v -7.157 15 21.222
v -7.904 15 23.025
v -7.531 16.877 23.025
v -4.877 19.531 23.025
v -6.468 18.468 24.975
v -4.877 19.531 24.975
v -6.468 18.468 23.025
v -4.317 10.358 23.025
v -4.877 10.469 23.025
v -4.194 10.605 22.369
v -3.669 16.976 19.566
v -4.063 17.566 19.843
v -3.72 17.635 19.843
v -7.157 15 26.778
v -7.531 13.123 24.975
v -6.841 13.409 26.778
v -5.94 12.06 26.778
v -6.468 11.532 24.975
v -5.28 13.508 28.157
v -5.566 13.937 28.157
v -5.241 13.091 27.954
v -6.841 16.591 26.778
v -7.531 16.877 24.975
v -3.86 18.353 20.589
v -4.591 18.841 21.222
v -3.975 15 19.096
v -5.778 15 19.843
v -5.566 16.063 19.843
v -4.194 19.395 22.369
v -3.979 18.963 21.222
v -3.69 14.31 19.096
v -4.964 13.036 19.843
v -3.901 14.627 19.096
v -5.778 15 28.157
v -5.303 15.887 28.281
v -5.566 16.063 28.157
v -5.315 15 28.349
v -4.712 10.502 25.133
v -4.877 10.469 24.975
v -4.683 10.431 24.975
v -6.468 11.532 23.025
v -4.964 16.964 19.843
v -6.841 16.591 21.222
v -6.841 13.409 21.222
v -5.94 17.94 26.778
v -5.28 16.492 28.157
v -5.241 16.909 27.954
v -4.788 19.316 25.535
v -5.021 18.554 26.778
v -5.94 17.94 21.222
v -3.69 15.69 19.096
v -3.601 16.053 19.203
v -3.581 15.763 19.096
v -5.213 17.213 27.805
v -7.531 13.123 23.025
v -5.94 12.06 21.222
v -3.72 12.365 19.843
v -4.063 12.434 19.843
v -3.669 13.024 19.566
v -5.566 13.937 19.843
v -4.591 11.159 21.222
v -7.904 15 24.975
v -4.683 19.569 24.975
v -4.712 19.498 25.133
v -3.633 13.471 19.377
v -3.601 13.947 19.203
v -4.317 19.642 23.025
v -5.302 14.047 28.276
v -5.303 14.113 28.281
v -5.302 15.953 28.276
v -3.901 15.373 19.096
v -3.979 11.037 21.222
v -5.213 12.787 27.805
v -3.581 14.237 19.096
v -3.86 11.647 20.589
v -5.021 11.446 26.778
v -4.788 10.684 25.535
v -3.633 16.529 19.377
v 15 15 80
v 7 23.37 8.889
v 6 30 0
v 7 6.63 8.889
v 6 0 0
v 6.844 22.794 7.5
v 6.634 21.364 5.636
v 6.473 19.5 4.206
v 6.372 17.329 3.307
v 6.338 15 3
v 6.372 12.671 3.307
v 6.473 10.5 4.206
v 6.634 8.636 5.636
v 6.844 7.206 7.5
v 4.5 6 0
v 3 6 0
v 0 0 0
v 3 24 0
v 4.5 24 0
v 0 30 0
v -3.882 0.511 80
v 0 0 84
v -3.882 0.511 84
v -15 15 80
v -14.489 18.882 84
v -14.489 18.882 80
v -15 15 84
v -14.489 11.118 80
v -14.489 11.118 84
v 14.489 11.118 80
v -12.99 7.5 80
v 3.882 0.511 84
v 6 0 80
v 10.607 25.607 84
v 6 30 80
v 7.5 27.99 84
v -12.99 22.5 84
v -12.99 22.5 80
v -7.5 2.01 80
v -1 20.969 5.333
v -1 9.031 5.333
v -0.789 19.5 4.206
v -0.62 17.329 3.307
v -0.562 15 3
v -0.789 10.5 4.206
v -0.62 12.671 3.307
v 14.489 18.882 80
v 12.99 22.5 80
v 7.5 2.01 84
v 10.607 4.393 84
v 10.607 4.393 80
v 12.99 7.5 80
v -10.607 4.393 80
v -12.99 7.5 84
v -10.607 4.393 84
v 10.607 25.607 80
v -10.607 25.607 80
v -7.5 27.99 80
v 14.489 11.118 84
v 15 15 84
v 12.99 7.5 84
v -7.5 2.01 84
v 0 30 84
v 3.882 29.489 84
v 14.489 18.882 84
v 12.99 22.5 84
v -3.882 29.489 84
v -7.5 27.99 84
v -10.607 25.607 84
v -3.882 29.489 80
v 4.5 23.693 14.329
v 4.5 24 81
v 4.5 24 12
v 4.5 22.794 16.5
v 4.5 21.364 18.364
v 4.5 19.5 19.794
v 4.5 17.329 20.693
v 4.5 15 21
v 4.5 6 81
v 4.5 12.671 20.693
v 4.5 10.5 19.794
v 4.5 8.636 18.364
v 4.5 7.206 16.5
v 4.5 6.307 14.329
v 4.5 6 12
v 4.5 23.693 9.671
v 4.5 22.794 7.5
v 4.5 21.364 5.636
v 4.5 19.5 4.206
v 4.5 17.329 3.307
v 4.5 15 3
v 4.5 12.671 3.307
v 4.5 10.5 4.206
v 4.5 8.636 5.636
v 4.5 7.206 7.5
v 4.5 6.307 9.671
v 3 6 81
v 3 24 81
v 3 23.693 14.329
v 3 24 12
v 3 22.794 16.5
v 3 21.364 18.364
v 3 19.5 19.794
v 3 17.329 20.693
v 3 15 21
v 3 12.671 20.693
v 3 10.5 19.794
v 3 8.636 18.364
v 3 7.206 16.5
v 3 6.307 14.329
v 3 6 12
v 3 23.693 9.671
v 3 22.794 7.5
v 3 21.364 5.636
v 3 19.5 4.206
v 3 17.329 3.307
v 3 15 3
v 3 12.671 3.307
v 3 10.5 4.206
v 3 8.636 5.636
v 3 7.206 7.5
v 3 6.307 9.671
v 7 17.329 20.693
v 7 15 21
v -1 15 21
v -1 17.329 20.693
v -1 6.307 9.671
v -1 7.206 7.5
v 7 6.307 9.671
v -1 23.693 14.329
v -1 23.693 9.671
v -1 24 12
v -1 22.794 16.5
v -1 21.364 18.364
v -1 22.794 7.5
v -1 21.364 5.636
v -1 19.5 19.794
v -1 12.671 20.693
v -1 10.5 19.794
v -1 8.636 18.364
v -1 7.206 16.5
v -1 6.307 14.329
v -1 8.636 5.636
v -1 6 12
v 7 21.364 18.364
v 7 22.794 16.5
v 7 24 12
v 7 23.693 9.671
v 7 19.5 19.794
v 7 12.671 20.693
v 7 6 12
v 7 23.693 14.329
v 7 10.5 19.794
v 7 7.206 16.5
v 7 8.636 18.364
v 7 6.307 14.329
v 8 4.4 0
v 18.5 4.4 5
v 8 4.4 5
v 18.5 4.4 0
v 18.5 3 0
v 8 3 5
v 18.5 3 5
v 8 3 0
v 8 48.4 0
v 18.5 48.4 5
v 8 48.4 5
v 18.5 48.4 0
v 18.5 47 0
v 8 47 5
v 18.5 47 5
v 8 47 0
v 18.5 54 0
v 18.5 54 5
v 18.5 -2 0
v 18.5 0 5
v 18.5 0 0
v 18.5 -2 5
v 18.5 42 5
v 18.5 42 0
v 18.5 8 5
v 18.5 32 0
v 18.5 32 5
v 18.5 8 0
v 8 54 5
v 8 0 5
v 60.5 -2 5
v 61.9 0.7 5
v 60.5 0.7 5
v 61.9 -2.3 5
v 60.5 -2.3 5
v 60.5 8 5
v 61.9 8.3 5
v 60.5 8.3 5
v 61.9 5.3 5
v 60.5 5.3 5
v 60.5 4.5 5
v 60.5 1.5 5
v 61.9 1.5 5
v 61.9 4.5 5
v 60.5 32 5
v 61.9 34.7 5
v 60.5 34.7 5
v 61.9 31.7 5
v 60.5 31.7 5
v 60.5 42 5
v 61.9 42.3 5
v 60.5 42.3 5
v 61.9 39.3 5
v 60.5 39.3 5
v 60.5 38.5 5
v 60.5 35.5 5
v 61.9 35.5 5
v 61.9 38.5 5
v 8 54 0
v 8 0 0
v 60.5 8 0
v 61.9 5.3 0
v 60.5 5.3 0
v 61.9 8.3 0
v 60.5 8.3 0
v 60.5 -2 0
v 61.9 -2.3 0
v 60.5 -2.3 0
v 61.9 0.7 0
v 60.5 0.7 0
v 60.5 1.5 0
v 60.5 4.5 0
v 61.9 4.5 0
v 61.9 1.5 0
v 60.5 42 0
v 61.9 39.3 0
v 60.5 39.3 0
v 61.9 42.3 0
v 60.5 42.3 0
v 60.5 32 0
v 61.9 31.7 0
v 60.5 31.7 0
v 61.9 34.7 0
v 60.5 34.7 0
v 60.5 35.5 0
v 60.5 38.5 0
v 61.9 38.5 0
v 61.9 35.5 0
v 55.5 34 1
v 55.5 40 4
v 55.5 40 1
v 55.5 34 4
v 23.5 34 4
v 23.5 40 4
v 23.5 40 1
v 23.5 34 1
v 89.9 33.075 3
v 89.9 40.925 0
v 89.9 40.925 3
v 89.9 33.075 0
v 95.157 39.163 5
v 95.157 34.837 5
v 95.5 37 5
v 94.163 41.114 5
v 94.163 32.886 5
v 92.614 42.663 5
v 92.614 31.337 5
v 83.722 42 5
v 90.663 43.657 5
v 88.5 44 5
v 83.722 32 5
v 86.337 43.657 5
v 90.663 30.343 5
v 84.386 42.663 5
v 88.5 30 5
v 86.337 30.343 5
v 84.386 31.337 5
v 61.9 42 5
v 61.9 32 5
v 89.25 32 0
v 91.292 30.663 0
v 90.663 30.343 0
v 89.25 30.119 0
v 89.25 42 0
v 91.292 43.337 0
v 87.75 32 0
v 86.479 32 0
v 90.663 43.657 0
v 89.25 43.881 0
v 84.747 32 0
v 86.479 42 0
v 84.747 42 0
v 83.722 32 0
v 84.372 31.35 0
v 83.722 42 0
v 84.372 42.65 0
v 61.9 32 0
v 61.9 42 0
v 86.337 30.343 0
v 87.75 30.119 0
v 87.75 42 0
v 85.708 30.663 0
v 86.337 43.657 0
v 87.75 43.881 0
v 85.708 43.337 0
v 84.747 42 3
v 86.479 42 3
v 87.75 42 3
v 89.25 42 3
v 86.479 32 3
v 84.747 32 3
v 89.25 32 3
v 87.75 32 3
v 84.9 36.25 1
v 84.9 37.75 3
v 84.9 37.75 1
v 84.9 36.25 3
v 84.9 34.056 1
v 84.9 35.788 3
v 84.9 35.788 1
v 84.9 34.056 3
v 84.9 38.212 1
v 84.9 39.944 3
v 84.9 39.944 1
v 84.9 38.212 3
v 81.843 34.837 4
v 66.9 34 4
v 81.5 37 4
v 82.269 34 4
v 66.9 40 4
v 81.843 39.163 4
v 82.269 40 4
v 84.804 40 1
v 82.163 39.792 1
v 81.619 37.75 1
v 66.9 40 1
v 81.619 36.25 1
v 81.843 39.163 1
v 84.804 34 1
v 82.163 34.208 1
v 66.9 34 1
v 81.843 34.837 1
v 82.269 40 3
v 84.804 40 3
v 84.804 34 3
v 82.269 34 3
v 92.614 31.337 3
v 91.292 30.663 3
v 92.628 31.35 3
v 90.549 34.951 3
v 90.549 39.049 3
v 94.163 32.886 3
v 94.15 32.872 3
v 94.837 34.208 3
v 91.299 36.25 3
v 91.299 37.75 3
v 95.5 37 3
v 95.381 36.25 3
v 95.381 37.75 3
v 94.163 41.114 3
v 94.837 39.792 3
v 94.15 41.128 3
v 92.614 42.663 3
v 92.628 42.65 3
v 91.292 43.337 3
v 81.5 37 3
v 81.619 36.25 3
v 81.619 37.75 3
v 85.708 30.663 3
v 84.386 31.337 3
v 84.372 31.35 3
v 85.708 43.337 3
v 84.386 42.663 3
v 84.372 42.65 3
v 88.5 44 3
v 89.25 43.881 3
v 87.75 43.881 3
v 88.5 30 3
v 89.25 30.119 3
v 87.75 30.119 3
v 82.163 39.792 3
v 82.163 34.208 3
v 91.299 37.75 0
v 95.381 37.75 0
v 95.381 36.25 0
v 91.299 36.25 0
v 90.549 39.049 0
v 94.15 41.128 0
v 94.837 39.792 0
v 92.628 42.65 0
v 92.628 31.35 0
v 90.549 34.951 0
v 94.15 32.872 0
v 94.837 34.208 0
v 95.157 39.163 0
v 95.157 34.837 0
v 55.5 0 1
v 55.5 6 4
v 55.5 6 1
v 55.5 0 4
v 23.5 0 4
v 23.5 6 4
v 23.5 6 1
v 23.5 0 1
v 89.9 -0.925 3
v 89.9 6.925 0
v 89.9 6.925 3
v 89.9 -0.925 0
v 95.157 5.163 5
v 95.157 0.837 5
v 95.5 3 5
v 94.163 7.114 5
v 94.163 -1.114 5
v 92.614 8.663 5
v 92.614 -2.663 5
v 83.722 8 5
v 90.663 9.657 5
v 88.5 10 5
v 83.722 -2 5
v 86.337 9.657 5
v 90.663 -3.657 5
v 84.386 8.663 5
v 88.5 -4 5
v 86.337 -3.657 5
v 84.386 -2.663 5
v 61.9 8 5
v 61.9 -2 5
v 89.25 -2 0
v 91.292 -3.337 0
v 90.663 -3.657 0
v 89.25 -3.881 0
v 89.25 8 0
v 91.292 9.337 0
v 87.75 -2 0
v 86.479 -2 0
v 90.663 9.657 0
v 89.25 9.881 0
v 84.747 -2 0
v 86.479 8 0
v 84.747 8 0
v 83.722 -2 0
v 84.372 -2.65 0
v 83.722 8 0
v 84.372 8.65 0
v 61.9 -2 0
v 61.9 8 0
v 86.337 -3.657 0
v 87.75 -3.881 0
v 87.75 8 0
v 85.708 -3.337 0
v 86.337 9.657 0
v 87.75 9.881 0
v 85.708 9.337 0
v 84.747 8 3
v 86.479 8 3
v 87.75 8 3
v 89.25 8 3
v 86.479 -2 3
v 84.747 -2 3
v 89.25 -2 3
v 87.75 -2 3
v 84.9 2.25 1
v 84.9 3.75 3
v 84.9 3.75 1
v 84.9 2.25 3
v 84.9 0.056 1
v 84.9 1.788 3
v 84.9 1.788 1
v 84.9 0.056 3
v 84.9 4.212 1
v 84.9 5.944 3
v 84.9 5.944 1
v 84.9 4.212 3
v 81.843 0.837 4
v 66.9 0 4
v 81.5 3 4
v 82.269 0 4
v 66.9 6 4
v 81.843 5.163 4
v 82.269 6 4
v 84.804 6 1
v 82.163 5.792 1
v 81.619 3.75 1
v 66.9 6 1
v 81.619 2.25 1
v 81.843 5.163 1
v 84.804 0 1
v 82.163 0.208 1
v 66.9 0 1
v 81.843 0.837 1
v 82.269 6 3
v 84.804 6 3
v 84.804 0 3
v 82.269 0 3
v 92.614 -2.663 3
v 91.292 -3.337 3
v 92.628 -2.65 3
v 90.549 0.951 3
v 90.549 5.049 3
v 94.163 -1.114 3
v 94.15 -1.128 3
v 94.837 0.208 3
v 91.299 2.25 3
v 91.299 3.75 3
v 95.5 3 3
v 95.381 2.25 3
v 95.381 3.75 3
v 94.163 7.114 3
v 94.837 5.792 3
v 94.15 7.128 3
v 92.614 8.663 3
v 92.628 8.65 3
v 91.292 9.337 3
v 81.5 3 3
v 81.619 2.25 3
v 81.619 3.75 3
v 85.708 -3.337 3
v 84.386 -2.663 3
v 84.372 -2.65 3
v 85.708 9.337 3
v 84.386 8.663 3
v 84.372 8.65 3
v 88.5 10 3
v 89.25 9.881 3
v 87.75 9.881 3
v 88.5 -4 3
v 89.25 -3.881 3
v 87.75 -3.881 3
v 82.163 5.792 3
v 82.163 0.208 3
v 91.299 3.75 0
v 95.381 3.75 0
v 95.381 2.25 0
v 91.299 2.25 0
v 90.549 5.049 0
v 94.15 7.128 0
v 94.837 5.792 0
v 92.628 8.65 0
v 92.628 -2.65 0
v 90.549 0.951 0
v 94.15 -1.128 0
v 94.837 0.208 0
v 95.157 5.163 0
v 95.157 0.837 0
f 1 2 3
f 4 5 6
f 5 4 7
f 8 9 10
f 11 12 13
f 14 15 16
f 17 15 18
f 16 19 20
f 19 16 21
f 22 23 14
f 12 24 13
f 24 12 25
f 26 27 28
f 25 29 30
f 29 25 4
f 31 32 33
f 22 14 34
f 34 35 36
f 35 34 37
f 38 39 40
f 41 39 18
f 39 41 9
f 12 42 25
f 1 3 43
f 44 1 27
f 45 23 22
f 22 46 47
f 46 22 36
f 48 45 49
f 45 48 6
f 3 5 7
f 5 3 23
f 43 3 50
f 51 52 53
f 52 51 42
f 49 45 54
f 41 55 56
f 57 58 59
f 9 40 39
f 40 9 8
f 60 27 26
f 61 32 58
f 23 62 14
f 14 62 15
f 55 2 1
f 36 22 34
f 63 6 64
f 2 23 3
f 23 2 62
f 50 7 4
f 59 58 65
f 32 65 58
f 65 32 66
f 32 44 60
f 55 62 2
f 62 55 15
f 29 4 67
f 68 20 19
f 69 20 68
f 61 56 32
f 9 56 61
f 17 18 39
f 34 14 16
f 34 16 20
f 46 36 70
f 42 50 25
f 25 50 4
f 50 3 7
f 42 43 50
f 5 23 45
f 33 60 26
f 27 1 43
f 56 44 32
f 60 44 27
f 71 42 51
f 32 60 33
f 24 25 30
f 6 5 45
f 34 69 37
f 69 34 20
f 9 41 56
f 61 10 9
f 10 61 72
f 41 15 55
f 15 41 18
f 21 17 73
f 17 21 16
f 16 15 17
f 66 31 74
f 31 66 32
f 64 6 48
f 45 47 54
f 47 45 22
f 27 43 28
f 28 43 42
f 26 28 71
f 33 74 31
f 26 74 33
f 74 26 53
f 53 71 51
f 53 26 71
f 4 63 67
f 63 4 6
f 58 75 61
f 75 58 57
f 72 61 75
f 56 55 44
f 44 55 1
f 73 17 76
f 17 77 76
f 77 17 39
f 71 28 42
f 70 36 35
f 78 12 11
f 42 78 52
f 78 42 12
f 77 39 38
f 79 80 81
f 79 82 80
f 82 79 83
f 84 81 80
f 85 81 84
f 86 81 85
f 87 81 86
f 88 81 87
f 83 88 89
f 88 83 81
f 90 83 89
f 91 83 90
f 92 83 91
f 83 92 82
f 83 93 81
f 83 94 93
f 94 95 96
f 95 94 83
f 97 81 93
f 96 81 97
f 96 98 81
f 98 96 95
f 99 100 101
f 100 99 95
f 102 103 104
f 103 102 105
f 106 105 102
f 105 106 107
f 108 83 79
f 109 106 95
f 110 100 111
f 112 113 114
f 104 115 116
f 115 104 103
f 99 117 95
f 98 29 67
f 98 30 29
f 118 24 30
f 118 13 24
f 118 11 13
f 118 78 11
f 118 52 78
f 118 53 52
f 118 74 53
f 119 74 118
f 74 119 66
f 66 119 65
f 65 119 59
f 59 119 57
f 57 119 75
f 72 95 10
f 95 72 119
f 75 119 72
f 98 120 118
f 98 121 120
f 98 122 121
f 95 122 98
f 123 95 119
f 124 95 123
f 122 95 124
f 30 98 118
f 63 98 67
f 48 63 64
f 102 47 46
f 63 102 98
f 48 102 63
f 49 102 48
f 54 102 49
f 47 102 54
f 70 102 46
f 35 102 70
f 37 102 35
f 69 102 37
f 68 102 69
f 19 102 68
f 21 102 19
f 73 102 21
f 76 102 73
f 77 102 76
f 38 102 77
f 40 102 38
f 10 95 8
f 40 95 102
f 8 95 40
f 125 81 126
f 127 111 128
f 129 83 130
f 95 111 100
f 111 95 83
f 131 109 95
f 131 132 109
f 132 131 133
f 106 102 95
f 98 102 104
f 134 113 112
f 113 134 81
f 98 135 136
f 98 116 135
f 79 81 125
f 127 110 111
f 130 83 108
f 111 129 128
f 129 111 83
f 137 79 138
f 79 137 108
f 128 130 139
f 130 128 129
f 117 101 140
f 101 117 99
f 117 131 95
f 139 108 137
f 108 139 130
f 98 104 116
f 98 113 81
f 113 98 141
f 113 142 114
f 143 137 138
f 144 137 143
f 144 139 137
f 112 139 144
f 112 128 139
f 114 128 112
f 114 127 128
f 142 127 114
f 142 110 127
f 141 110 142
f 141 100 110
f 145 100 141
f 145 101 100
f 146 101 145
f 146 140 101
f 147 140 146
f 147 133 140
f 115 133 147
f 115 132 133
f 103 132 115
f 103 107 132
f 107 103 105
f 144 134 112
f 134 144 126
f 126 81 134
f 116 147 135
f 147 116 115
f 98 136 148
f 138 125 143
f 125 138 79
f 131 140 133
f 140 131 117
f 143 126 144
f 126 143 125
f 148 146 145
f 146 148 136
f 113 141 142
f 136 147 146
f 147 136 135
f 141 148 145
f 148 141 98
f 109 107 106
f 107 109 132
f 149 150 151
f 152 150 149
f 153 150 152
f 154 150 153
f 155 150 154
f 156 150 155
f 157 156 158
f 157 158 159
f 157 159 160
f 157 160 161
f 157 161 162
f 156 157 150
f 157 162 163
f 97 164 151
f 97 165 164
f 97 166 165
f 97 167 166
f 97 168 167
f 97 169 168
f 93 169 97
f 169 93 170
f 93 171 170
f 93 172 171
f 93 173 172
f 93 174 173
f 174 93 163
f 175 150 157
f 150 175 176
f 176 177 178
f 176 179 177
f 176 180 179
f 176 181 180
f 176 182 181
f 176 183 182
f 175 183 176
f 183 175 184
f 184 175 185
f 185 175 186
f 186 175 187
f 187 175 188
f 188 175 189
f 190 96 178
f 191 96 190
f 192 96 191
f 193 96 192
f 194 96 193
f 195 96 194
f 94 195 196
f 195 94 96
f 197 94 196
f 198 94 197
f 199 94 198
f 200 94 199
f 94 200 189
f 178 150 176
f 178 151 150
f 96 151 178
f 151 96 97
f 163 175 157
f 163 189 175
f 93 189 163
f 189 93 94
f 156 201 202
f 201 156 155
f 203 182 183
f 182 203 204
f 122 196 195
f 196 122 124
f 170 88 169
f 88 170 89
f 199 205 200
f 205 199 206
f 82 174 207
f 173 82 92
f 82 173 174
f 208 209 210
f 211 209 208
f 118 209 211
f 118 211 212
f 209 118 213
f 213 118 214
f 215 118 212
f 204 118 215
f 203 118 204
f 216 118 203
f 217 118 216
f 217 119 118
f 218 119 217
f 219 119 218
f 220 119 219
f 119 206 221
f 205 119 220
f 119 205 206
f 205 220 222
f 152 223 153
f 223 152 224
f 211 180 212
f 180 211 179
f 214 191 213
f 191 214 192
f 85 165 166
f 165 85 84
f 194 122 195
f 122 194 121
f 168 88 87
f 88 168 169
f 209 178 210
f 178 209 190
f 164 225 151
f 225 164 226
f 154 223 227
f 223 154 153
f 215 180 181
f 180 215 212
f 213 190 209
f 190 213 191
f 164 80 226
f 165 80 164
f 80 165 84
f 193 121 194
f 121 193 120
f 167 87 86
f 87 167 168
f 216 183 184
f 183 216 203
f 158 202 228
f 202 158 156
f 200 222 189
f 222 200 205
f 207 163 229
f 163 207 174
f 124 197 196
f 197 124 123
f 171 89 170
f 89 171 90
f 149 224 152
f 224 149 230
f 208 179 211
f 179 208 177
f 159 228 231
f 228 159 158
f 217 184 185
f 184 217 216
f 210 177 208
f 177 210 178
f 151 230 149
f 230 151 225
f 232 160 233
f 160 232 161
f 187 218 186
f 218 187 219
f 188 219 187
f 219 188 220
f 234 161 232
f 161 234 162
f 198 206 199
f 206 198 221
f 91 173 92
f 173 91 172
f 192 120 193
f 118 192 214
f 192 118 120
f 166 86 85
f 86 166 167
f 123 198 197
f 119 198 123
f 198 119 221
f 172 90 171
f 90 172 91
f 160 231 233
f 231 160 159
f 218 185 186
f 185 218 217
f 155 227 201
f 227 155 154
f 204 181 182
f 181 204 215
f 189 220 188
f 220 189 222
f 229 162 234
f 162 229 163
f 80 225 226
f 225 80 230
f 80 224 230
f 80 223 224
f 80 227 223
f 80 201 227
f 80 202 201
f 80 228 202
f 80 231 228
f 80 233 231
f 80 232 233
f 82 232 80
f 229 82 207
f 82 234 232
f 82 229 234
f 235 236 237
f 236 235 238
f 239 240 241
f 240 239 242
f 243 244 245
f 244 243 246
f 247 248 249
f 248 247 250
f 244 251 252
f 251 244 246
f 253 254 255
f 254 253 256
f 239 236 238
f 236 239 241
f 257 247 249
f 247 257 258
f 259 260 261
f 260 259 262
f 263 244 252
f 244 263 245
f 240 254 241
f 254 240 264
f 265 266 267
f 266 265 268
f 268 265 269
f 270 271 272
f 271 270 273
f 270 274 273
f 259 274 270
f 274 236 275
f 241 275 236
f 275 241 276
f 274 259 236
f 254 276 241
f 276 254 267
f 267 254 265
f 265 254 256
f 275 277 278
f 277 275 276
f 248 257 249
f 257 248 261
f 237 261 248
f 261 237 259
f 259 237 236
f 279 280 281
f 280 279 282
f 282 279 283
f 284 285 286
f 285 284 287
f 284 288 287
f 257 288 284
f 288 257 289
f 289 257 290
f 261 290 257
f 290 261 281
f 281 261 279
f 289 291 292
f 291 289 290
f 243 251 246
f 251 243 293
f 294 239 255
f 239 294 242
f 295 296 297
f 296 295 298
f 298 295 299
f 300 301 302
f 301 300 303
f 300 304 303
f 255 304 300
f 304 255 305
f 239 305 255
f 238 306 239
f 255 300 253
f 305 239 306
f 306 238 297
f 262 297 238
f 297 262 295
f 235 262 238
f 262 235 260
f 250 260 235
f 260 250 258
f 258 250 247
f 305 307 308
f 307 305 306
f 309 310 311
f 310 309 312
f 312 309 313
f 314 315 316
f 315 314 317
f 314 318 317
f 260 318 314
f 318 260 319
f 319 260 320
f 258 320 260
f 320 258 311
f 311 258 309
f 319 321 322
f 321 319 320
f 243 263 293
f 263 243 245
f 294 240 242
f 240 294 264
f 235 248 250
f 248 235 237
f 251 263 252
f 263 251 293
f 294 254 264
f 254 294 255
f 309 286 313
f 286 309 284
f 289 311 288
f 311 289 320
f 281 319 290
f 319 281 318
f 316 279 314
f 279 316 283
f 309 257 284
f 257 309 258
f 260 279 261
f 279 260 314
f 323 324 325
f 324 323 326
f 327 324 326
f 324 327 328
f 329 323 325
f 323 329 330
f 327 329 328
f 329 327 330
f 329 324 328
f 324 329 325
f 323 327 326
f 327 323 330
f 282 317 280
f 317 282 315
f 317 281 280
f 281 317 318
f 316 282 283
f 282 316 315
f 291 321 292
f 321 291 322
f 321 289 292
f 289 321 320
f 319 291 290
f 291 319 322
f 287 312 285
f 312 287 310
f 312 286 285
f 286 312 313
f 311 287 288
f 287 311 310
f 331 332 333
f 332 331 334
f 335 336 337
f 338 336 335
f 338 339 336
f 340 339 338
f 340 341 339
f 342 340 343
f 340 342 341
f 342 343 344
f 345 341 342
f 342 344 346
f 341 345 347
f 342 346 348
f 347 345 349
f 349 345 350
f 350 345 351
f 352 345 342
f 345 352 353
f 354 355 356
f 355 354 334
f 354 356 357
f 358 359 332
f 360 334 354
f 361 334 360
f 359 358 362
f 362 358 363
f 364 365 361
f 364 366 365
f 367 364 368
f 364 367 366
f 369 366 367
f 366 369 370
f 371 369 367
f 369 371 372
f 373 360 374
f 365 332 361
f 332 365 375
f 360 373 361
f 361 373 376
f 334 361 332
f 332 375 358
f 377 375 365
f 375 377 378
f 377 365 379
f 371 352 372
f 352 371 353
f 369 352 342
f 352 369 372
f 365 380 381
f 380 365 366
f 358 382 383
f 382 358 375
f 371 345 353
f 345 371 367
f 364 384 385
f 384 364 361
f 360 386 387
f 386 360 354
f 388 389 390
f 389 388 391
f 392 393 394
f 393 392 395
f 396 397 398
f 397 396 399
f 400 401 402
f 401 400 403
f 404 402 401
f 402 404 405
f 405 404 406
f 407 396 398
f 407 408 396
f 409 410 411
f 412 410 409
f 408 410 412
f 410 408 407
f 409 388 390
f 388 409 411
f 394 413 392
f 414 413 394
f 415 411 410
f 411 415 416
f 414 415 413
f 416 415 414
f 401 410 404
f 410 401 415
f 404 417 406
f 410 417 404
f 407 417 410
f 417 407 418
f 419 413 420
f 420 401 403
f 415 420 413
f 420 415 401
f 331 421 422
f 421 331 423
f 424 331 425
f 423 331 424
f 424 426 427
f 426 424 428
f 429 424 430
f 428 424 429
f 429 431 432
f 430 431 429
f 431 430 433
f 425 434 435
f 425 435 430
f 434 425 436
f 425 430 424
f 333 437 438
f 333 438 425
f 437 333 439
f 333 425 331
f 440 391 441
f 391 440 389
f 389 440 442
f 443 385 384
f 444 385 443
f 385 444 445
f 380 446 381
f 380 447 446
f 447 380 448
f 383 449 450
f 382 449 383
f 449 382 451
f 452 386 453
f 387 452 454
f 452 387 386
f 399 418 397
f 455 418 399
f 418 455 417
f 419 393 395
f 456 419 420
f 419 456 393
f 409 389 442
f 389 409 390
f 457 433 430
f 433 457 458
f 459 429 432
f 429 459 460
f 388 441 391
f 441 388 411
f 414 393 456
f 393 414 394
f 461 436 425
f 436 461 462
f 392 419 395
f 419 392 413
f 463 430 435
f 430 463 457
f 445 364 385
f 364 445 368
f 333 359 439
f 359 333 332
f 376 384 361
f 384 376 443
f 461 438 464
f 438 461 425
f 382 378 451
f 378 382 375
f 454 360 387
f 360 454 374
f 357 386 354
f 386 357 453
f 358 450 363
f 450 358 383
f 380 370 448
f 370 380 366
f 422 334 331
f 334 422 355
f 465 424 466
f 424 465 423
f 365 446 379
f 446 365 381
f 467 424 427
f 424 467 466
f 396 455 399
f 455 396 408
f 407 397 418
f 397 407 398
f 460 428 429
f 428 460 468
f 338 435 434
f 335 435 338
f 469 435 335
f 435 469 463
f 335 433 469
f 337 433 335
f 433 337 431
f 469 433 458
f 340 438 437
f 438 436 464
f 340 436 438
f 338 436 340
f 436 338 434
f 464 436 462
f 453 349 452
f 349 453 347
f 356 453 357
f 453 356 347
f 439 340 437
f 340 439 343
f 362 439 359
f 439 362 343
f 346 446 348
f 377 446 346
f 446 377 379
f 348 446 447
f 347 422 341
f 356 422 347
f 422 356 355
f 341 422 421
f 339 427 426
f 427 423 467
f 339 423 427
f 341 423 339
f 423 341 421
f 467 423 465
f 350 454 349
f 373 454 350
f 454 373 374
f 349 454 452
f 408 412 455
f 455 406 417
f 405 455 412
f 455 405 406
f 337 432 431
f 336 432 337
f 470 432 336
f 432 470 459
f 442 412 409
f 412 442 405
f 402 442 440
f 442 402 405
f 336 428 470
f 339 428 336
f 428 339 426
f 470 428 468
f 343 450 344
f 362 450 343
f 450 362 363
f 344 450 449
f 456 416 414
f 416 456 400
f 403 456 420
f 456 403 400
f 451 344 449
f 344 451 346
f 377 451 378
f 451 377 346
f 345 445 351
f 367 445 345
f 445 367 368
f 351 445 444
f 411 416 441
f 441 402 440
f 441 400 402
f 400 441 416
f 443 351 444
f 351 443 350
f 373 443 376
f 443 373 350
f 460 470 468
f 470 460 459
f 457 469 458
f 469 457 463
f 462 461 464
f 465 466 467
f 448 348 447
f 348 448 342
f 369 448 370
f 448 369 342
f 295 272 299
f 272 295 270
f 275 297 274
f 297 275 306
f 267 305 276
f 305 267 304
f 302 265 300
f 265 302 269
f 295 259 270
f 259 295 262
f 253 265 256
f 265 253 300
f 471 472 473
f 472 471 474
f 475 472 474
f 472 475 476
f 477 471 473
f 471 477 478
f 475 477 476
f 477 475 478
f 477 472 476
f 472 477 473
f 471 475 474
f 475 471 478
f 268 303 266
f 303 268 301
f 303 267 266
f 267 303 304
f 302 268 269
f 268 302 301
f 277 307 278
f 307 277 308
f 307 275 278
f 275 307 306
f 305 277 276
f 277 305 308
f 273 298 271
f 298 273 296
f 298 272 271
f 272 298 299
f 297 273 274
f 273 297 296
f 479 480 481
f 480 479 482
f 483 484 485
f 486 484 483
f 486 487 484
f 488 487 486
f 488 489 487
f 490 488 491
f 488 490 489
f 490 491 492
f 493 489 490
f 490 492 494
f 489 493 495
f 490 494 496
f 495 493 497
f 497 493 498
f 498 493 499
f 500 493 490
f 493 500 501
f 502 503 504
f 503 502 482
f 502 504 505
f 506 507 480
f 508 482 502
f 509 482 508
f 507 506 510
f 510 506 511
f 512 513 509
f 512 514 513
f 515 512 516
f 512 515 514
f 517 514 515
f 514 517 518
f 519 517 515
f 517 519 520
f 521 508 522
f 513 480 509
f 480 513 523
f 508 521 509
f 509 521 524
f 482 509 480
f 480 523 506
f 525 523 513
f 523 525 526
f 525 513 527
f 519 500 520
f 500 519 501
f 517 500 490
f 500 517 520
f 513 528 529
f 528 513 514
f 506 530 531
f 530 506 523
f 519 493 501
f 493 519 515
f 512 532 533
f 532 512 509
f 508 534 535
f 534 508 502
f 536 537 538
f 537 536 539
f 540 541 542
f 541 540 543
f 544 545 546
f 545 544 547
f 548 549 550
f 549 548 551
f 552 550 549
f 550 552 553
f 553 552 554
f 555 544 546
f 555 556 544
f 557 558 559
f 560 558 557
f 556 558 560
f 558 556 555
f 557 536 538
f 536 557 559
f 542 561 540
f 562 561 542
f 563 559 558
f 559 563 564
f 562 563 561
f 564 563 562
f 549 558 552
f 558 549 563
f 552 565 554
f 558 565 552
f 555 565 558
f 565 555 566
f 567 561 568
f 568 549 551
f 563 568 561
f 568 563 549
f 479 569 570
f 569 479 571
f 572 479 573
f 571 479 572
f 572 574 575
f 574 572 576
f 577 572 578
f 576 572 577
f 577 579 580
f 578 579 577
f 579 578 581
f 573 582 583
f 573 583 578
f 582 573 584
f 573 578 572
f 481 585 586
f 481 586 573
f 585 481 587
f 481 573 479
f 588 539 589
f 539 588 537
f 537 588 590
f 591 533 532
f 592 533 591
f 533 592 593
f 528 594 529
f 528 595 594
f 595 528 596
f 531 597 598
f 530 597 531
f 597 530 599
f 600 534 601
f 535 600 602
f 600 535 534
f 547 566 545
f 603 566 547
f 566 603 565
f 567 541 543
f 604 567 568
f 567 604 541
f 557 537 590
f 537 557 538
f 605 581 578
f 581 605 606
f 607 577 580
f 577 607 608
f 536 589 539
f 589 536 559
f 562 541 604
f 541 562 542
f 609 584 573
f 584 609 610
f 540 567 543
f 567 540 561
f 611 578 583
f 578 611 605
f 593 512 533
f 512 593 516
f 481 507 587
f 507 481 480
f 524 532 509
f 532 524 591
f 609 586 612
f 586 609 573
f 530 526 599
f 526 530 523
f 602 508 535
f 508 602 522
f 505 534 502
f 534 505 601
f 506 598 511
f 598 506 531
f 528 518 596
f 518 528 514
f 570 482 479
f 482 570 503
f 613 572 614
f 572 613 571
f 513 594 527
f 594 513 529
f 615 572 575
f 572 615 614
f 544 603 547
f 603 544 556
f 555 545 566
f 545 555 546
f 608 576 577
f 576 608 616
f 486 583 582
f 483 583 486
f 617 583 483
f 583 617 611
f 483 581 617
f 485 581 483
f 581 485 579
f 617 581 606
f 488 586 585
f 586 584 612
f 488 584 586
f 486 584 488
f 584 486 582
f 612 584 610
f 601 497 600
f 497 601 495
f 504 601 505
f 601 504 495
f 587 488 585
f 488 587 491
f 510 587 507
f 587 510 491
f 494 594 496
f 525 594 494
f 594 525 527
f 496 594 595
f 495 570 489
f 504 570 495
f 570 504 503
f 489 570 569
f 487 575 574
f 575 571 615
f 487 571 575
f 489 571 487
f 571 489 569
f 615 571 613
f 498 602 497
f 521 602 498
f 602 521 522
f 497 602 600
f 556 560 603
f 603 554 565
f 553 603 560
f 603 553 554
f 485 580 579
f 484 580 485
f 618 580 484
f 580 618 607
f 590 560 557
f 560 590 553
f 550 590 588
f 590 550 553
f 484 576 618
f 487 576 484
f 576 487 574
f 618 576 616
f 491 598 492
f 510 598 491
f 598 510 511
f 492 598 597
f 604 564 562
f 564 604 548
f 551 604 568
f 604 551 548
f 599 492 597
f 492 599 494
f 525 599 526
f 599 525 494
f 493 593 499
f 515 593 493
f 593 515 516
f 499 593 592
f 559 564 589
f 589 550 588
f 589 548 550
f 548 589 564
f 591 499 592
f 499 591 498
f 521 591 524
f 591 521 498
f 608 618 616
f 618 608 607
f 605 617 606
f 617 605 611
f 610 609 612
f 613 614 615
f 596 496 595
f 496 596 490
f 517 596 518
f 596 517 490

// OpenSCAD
// Compliant Mechanism Gripper — Single-Print Flex Actuator
// Squeeze the handle → fingers close. No assembly, no hardware.
// PETG or flexible PLA — 0.15mm, 2 walls, 10% infill
// The flexure joints are integral — monolithic part
// DUAL COLOR: rigid body (dark) | flexure zones (bright/translucent)

GRIP_W    = 30;   // Grip width
GRIP_H    = 80;   // Handle length
BODY_T    = 6.0;  // Rigid section thickness
FLEX_T    = 1.4;  // Flexure leaf thickness (key: thin = more flex)
FLEX_W    = 3.0;  // Flexure leaf width
FLEX_GAP  = 0.8;  // Gap between flexure notches
ARM_L     = 70;   // Finger arm length
ARM_W     = 10;
FINGER_T  = 5.0;
JAW_W     = 8;    // Jaw opening at rest
N_FLEX    = 3;    // Flexures per hinge joint

// ── Flexure hinge (living hinge zone) ─────────────────
module flexure_hinge(width, depth, n = N_FLEX) {
    // Series of parallel thin leaves → allow bending, resist axial load
    for (i = [0 : n - 1]) {
        translate([0, i * (FLEX_W + FLEX_GAP), 0])
            cube([FLEX_T, FLEX_W, depth]);
    }
}

// ── Rigid arm section ─────────────────────────────────
module rigid_arm(length, w, t) {
    difference() {
        cube([length, w, t]);
        // Lightening slot
        translate([5, 2, 1])
            cube([length - 10, w - 4, t - 2]);
    }
}

// ── Finger (one half) ─────────────────────────────────
module finger(side) {
    // side = 1 or -1 (left/right)
    reflect_y = (side > 0) ? 1 : -1;

    translate([0, side * (GRIP_W/2 + 2), 0]) {
        // Upper rigid section (above pivot)
        rigid_arm(ARM_L * 0.6, ARM_W, FINGER_T);

        // Flexure pivot 1 (at arm root)
        translate([ARM_L * 0.6, (ARM_W - (N_FLEX*(FLEX_W+FLEX_GAP)-FLEX_GAP))/2, 0])
            flexure_hinge(1, FINGER_T);

        // Lower rigid section
        translate([ARM_L * 0.6 + FLEX_T, 0, 0])
            rigid_arm(ARM_L * 0.4, ARM_W, FINGER_T);

        // Jaw pad (rubber-tip contact surface boss)
        translate([ARM_L, ARM_W/2, 0]) {
            difference() {
                cylinder(d = 14, h = FINGER_T, $fn = 20);
                // Grip pattern
                for (a = [0:30:150])
                    rotate([0, 0, a])
                        cube([16, 1.5, FINGER_T + 1], center = true);
            }
        }
    }
}

// ── Handle ────────────────────────────────────────────
module handle() {
    difference() {
        union() {
            // Main grip body
            hull() {
                cube([BODY_T, GRIP_W, GRIP_H]);
                translate([0, GRIP_W/2, GRIP_H])
                    cylinder(d = GRIP_W, h = 4, $fn = 24);
            }
            // Thumb rest bumps
            for (z = [GRIP_H * 0.3, GRIP_H * 0.55, GRIP_H * 0.75])
                translate([-3, GRIP_W/2, z])
                    sphere(d = 10, $fn = 16);
        }
        // Trigger slot (squeeze gap)
        translate([BODY_T/2, GRIP_W * 0.2, -1])
            cube([1.5, GRIP_W * 0.6, GRIP_H + 2]);
        // Finger hole at base
        translate([-1, GRIP_W/2, GRIP_H * 0.15])
            rotate([0, 90, 0])
                cylinder(d = 18, h = BODY_T + 2, $fn = 24);
    }
}

// ── Main flexure body (connects handle to fingers) ────
module flexure_body() {
    difference() {
        cube([ARM_L * 0.15, GRIP_W + ARM_W * 2 + 4, FINGER_T]);
        // Symmetric flexure cuts (force coupling)
        for (y = [ARM_W * 0.3, GRIP_W + ARM_W * 1.7])
            translate([-0.5, y, -1])
                cube([ARM_L * 0.15 + 1, FLEX_T, FINGER_T + 2]);
    }
}

// ── Assembly ─────────────────────────────────────────
// Color 1 (rigid PETG dark): handle + arms
handle();
translate([BODY_T + 2, 0, 0]) {
    flexure_body();
    // Fingers
    for (s = [1, -1])
        translate([ARM_L * 0.15, GRIP_W/2, 0])
            finger(s);
}
